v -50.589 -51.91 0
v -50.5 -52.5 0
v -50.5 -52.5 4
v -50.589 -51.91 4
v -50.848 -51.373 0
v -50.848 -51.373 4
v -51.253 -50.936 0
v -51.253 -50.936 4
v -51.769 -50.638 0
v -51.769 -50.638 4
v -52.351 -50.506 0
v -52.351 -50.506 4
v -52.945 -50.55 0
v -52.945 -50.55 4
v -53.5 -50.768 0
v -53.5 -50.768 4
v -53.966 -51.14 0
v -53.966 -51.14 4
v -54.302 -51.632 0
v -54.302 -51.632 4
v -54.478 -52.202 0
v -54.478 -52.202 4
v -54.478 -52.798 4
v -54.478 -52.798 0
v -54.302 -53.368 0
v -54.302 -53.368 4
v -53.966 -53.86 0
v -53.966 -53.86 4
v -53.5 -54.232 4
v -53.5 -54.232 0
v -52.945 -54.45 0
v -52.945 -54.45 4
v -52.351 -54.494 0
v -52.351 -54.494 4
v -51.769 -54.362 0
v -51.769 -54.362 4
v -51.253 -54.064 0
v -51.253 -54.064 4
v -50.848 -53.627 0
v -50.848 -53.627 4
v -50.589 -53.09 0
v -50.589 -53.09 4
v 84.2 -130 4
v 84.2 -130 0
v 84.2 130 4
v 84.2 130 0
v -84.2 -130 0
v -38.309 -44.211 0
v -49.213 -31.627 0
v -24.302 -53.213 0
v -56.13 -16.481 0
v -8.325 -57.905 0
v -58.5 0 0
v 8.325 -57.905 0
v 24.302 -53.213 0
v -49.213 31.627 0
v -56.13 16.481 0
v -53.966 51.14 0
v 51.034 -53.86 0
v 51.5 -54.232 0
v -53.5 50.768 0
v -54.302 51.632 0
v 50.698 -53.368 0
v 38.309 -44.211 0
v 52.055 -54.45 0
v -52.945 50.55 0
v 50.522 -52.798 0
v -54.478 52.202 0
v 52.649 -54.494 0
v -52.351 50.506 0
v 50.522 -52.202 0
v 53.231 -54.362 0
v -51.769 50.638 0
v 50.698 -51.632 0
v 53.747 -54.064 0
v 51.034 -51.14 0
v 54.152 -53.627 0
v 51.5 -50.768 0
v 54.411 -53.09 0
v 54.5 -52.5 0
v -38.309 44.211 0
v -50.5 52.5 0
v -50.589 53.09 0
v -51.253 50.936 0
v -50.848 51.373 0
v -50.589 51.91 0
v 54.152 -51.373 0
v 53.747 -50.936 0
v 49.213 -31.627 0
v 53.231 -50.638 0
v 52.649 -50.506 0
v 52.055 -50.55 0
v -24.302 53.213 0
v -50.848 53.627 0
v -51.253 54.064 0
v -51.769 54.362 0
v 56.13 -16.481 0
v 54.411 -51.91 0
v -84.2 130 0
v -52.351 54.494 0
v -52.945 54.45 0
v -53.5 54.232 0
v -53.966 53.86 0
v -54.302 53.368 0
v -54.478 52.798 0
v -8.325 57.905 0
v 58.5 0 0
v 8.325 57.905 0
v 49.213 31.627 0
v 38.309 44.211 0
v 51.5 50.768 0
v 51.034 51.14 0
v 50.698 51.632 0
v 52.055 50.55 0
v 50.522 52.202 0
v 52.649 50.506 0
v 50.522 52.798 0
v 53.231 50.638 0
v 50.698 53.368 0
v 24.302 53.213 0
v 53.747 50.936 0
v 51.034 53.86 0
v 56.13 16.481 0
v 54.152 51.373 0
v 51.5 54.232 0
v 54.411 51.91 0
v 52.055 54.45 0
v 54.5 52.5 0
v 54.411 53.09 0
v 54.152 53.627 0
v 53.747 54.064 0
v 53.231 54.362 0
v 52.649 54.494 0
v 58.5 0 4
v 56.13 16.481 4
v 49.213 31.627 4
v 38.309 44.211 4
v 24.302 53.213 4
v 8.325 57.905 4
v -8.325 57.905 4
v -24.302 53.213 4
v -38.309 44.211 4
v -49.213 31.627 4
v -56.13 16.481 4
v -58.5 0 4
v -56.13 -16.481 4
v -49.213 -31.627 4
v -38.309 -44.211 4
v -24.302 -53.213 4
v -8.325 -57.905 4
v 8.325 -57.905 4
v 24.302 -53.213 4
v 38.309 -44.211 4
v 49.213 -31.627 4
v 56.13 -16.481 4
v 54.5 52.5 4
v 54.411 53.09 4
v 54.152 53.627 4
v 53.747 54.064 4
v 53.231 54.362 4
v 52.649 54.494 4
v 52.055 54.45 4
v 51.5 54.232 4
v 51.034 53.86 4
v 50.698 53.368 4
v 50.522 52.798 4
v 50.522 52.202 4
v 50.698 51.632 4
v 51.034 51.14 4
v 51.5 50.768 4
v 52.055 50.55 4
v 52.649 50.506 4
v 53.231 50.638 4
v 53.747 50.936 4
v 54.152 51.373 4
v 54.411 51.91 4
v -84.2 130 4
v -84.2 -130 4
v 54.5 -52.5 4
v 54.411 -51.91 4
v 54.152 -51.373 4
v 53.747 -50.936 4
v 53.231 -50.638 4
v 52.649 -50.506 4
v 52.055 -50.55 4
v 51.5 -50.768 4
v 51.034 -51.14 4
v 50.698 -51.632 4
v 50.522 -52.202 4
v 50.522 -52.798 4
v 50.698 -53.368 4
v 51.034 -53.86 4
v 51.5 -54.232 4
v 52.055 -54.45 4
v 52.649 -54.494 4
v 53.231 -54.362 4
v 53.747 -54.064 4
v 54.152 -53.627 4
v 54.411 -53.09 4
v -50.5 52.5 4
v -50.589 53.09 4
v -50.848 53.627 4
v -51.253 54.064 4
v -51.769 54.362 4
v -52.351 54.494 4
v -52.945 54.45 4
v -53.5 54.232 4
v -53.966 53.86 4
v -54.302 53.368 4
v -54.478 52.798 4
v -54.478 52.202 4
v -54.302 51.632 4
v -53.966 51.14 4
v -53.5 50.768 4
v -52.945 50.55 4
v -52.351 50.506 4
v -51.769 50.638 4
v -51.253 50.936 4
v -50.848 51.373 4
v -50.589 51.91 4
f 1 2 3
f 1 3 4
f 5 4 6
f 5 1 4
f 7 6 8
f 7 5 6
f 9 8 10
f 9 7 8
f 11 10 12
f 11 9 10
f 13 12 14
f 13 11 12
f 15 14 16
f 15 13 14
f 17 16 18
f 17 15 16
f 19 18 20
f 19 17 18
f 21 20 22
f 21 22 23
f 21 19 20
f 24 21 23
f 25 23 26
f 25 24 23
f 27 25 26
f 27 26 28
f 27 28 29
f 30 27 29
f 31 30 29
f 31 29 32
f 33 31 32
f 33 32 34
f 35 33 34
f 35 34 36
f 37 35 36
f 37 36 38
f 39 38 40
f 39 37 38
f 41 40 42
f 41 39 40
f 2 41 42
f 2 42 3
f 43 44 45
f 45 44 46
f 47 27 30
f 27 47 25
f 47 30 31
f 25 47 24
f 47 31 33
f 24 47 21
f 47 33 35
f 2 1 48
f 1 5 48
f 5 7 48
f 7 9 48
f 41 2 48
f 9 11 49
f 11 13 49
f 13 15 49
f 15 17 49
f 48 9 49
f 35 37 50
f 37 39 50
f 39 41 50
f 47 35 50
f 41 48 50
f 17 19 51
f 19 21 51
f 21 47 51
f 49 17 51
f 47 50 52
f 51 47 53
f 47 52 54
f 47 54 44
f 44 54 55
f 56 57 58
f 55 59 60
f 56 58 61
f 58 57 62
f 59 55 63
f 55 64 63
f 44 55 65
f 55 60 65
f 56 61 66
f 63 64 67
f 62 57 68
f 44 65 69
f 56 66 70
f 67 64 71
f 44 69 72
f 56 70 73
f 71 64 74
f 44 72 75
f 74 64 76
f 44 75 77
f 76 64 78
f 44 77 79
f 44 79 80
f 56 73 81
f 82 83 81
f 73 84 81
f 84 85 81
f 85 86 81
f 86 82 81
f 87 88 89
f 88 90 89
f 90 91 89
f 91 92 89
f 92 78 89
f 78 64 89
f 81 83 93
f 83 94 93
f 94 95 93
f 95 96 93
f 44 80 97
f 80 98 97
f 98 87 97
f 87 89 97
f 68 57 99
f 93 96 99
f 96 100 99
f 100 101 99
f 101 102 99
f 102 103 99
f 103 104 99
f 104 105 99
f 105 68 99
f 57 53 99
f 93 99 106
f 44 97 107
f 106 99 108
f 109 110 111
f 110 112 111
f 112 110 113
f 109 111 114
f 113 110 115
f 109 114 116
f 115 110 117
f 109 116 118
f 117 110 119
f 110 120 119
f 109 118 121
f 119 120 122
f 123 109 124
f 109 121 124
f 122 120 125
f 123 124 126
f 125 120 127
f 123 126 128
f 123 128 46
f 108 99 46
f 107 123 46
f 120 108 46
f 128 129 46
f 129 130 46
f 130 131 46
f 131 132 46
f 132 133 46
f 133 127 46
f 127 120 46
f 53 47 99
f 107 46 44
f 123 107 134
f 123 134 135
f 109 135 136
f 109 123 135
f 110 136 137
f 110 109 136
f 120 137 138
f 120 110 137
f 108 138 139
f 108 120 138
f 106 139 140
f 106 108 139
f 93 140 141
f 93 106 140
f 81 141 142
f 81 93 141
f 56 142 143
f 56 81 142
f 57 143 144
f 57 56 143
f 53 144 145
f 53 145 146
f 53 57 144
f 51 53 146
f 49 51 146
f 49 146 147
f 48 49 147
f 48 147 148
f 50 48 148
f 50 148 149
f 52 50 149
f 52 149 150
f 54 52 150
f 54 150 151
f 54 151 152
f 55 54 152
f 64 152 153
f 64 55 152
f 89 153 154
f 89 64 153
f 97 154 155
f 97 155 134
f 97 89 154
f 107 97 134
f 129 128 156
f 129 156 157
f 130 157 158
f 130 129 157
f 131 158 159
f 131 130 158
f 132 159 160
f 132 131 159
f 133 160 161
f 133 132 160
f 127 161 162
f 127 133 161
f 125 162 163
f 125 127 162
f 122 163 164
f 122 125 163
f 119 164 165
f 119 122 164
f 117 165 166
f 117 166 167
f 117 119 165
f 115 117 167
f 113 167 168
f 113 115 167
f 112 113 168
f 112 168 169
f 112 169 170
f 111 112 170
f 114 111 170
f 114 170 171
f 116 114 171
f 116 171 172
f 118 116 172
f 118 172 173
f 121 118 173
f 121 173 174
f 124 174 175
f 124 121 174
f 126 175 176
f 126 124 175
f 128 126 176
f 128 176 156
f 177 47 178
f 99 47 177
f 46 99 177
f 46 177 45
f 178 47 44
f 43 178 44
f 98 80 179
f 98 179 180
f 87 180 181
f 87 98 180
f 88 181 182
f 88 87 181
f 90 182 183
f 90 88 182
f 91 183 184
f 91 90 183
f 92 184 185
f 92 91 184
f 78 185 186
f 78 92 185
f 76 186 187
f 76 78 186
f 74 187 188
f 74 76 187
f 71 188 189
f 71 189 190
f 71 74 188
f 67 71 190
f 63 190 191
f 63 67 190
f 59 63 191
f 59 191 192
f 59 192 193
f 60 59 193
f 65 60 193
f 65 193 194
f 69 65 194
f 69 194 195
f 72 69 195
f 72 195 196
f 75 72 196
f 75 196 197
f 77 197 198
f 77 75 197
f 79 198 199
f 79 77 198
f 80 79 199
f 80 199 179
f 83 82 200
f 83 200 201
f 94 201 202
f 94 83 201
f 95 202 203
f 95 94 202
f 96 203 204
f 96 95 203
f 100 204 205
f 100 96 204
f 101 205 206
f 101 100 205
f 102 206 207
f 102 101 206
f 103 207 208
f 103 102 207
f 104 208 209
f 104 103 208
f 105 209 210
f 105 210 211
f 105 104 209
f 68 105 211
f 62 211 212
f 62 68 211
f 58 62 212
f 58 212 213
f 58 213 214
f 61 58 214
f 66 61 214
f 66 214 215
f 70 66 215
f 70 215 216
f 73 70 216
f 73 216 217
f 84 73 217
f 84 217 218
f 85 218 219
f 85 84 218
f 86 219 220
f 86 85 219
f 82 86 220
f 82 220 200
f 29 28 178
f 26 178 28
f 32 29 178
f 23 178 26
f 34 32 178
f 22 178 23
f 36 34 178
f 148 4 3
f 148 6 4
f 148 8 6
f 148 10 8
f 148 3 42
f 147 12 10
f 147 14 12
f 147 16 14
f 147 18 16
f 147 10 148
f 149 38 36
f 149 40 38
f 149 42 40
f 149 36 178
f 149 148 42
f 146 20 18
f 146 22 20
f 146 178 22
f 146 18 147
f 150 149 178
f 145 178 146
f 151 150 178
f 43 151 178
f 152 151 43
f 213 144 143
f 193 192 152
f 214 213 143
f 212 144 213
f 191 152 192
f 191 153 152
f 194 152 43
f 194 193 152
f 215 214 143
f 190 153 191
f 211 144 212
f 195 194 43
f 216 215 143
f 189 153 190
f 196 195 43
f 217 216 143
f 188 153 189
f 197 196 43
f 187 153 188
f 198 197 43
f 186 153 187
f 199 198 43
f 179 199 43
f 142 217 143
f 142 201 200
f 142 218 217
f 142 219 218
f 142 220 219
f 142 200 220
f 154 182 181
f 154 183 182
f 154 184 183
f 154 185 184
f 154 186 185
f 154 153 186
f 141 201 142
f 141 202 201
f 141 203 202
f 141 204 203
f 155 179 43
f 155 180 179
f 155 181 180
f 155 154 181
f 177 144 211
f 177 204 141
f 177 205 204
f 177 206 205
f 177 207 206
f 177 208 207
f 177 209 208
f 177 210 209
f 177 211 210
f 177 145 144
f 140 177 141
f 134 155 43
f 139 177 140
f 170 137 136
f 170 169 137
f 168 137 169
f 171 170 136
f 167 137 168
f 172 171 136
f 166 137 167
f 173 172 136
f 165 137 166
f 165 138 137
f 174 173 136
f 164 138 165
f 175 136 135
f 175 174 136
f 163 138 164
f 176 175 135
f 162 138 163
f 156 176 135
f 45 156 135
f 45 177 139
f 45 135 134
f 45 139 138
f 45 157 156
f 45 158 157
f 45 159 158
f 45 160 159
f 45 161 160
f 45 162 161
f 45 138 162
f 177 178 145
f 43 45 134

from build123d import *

# Parameters (mm, degrees)
SKETCH1_W          = 168.4
SKETCH1_H          = 260
EXTRUDE1_DEPTH     = 4
SKETCH2_R          = 58.5
SKETCH2_R_2        = 2
CUT_EXTRUDE5_DEPTH = 4


with BuildPart() as part:
    # Sketch1 → Extrude1 (new body)
    with BuildSketch(Plane.XY):
        Rectangle(SKETCH1_W, SKETCH1_H)
    extrude(amount=EXTRUDE1_DEPTH)

    # Sketch2 → Cut-Extrude5 (cut)
    with BuildSketch(Plane.XY):
        Circle(SKETCH2_R)
        with Locations((-52.5, -52.5)):
            Circle(SKETCH2_R_2)
        with Locations((52.5, -52.5)):
            Circle(SKETCH2_R_2)
        with Locations((52.5, 52.5)):
            Circle(SKETCH2_R_2)
        with Locations((-52.5, 52.5)):
            Circle(SKETCH2_R_2)
    extrude(amount=CUT_EXTRUDE5_DEPTH, mode=Mode.SUBTRACT)


solid = part.part
